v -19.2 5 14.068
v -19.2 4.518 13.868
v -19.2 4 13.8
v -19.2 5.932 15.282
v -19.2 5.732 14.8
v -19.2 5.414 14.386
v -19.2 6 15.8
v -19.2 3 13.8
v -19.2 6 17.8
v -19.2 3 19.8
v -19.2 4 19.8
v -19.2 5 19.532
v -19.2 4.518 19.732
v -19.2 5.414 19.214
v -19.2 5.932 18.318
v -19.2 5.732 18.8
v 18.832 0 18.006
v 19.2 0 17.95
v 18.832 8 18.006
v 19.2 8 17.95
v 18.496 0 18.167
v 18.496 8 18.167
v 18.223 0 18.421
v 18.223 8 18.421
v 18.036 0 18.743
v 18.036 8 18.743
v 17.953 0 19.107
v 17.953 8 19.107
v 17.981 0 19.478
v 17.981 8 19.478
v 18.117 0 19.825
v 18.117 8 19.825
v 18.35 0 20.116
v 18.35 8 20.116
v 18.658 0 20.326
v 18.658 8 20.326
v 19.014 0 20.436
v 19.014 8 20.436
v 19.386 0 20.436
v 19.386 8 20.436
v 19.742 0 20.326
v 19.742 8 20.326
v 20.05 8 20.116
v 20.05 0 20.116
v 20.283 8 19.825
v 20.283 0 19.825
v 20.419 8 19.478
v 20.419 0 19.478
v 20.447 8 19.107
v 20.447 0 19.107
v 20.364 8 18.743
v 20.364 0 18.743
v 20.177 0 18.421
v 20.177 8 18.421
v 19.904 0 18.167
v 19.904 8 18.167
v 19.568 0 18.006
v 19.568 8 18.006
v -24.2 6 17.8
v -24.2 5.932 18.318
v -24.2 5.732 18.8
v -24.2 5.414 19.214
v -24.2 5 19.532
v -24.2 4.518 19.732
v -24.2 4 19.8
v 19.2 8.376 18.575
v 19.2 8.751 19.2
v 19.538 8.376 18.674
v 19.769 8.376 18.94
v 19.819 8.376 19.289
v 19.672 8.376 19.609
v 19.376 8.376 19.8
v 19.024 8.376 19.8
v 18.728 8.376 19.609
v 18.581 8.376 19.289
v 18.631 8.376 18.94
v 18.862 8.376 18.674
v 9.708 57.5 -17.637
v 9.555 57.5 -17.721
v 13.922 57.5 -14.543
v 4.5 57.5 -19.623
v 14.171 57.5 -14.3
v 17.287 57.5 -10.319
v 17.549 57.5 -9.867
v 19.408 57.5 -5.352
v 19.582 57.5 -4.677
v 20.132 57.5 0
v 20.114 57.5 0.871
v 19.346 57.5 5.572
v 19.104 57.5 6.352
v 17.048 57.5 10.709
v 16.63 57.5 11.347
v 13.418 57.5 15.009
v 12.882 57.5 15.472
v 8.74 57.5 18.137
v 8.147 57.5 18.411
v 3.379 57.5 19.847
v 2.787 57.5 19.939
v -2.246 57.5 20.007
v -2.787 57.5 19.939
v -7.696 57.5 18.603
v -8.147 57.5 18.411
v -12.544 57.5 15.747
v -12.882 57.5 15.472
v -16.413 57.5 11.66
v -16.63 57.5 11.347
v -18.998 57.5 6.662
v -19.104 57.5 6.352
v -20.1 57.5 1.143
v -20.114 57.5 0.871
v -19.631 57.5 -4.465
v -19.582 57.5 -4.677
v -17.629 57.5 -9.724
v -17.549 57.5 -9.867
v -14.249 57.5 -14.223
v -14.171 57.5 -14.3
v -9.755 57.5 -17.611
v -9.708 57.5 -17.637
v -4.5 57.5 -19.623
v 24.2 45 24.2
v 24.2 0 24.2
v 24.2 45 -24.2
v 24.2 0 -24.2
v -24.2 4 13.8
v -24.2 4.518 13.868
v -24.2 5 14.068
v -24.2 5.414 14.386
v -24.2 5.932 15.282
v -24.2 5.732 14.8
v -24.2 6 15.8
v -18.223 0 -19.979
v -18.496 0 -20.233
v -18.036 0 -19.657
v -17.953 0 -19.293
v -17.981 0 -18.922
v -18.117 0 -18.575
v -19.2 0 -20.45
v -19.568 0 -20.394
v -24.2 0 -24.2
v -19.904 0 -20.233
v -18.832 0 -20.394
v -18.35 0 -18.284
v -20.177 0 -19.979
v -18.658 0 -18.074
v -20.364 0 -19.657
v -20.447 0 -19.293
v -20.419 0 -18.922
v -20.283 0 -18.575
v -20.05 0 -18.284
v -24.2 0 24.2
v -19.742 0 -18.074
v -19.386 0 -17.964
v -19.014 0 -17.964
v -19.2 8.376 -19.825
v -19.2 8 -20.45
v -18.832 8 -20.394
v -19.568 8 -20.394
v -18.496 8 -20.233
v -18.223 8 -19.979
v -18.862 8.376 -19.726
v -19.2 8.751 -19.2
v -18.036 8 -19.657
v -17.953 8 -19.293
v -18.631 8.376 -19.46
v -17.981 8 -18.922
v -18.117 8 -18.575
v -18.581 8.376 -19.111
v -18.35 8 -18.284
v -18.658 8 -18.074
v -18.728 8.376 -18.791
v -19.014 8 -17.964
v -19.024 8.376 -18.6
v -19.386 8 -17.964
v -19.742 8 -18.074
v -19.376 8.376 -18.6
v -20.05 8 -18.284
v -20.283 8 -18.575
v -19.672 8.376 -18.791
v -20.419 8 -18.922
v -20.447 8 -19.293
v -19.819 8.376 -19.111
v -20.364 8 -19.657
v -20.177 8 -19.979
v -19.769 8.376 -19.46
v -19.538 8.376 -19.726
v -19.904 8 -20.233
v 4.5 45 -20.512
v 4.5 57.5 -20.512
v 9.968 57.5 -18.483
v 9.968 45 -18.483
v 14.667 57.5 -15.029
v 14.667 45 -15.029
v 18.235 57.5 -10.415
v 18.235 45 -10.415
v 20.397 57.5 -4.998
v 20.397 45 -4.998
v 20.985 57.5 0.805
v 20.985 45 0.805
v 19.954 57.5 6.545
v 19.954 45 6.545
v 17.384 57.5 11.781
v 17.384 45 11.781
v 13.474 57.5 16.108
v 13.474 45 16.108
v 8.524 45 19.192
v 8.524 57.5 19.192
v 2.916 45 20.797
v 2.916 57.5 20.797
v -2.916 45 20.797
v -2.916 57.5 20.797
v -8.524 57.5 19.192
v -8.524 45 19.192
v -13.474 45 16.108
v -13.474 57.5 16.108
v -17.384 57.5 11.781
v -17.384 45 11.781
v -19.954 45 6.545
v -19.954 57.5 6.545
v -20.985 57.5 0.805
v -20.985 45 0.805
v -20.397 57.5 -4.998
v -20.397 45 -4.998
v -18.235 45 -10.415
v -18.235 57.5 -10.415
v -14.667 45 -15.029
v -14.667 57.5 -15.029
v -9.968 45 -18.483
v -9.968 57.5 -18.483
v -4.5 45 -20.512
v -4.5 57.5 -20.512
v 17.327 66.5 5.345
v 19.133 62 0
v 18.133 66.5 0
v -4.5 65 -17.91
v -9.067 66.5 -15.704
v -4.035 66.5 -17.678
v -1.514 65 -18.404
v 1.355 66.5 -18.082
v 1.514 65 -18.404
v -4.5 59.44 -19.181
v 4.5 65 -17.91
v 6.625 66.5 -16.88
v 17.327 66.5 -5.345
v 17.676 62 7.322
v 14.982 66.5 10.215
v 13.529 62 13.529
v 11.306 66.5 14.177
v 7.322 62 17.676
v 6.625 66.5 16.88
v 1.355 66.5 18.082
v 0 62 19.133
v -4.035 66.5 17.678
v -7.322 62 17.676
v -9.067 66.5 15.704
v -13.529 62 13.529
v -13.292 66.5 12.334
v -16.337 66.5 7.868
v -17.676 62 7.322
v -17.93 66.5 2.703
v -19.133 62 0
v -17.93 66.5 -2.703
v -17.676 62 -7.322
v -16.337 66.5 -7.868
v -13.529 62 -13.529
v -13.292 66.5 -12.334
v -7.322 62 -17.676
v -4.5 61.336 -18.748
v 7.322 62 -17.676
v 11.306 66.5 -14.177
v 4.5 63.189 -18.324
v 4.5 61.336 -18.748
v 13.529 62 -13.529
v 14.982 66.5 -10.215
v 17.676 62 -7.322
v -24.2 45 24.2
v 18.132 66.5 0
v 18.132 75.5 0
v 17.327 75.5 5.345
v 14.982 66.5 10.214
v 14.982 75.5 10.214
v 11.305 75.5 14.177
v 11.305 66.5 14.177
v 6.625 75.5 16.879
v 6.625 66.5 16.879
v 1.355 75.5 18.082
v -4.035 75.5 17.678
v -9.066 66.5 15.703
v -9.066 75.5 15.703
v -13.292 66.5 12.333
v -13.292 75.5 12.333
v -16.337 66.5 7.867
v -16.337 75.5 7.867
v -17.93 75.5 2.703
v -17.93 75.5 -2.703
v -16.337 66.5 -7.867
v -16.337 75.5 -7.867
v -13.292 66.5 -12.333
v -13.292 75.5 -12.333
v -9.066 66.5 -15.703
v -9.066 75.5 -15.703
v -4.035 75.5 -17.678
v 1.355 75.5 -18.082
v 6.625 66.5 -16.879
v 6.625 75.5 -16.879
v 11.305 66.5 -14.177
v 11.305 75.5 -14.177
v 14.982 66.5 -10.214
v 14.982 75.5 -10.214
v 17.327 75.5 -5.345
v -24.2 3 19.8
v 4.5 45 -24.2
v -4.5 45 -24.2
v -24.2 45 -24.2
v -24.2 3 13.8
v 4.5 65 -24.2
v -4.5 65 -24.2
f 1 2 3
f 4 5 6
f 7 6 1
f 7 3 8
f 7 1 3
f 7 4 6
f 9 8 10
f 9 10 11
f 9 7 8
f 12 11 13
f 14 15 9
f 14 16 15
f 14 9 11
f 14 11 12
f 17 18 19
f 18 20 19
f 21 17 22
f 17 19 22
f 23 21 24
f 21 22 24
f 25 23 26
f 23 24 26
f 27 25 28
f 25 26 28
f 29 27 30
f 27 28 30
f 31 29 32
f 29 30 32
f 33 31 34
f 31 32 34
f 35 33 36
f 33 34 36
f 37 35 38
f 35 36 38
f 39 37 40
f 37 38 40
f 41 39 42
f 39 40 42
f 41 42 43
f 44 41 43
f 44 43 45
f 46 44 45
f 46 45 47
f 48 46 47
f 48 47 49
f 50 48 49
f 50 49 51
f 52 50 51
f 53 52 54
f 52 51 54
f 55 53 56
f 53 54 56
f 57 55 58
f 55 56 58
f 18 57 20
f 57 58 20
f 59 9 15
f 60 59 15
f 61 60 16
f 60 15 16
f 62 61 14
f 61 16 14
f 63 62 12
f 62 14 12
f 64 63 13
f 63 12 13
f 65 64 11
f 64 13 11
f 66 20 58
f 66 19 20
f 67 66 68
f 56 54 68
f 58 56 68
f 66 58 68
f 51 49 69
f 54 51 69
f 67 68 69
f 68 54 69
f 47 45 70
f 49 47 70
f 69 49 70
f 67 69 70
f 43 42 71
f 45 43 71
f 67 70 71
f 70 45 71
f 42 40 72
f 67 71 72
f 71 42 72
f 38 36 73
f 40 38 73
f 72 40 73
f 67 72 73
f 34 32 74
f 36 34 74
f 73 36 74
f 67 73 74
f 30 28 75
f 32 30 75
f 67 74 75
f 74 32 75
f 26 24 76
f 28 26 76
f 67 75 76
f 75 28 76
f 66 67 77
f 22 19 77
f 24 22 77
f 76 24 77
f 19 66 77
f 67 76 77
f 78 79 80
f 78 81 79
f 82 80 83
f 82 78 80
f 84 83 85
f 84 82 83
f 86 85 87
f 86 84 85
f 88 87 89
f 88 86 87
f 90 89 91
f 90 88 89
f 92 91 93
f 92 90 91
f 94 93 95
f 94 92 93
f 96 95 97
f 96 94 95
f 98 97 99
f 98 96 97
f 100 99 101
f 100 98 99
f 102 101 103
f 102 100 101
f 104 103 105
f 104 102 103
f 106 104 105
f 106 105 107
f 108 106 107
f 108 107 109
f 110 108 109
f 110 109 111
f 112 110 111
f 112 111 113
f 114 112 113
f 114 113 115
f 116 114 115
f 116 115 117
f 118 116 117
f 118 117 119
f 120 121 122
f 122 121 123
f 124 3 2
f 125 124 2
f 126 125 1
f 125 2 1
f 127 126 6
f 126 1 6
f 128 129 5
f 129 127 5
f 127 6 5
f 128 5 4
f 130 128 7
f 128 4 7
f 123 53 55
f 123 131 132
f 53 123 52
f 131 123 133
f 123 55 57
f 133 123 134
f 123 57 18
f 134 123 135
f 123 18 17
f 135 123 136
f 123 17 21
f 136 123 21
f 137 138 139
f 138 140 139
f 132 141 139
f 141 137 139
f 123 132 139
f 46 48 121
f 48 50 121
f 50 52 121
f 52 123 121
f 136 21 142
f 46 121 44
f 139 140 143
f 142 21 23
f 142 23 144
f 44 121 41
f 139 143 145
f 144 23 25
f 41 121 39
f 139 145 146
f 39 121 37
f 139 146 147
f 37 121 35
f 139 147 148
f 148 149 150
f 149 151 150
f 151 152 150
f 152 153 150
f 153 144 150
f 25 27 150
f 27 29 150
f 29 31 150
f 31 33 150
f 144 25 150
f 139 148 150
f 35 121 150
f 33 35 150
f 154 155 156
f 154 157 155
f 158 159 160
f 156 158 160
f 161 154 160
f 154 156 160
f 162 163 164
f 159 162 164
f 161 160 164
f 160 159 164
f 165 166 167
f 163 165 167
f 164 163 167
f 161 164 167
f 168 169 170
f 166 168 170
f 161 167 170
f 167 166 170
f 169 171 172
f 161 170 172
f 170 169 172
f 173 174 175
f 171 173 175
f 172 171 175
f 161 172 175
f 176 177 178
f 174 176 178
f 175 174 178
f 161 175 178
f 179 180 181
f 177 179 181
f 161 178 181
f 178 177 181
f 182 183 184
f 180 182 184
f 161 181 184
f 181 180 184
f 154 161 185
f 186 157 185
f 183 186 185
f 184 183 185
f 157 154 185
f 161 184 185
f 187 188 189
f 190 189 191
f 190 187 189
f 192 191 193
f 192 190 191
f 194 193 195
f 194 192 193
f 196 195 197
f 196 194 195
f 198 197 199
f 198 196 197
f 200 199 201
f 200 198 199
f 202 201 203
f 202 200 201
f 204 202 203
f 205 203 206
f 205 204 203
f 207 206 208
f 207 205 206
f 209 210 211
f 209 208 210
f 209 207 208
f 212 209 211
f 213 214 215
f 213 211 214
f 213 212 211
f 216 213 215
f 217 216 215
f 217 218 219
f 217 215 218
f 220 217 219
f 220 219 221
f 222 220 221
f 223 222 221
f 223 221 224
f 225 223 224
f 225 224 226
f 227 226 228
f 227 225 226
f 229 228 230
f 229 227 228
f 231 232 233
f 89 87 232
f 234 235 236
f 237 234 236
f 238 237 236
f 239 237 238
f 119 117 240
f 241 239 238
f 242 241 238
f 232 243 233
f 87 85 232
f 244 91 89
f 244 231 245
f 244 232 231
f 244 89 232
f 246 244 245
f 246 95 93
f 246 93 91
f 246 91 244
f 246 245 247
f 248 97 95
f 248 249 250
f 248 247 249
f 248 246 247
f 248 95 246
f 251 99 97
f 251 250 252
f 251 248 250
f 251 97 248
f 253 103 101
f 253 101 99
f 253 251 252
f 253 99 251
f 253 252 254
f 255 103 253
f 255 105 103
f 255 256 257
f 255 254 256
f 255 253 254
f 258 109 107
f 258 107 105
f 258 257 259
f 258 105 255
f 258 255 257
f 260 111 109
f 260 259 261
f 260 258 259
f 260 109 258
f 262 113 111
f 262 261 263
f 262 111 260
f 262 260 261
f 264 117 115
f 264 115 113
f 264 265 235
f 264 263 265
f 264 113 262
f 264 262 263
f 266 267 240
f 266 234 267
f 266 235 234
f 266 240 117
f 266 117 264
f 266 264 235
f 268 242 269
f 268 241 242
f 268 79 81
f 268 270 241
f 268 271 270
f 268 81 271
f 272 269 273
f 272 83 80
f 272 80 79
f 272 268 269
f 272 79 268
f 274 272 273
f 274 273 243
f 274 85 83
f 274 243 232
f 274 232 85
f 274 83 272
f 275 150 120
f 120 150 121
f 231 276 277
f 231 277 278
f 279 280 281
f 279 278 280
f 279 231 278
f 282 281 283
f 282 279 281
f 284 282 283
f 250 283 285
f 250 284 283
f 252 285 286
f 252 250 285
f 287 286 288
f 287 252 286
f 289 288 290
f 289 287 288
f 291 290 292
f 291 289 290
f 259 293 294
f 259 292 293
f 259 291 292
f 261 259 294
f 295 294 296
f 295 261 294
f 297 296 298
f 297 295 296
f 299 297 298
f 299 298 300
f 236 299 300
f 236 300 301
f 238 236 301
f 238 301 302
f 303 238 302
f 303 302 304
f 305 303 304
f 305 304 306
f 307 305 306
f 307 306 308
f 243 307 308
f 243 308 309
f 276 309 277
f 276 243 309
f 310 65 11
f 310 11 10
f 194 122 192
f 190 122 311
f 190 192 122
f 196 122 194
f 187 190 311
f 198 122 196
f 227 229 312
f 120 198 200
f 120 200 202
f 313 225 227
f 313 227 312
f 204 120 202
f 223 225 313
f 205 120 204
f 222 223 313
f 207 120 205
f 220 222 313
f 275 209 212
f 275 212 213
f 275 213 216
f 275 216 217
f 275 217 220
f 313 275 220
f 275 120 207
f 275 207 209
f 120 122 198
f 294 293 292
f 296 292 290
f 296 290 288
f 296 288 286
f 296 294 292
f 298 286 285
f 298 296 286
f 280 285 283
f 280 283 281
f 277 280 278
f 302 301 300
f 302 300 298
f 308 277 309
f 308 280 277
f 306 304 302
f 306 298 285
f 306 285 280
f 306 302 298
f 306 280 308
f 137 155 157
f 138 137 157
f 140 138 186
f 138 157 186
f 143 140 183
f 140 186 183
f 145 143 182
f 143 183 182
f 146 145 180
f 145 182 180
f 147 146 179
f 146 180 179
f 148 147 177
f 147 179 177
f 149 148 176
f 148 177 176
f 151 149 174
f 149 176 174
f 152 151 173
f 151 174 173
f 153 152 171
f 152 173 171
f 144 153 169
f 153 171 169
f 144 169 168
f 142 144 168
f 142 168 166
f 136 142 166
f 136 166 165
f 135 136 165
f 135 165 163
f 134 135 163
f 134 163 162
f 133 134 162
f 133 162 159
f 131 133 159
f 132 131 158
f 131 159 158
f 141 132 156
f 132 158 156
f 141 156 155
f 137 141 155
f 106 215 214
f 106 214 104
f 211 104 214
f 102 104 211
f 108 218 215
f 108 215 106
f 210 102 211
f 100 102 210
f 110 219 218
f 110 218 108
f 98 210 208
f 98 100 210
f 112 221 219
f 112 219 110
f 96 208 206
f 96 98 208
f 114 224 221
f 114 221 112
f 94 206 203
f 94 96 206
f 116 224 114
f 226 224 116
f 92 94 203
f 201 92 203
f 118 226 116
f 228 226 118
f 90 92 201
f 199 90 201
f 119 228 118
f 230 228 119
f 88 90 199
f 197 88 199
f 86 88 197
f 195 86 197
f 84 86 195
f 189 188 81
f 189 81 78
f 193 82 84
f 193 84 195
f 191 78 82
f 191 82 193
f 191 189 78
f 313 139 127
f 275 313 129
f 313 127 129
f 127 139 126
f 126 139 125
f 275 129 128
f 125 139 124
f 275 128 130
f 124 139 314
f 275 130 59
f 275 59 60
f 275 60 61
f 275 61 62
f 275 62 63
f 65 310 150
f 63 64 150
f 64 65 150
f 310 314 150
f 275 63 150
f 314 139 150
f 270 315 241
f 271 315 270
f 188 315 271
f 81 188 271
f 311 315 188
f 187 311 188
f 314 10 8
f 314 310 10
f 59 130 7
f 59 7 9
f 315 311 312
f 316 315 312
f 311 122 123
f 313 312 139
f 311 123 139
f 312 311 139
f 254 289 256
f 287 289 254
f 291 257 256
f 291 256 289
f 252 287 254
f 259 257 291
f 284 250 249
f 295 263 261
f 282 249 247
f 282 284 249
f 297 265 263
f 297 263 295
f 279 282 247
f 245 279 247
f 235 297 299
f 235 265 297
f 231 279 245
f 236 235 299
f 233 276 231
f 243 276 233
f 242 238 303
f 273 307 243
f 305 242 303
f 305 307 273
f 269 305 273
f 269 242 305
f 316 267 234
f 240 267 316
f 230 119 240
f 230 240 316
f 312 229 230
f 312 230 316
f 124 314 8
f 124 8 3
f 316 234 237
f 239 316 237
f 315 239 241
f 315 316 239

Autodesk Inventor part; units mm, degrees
ref_plane "YZ Plane" through (0, 0, 0) normal (1, 0, 0) x (0, 1, 0)
ref_plane "XZ Plane" through (0, 0, 0) normal (0, 1, 0) x (-1, 0, 0)
ref_plane "XY Plane" through (0, 0, 0) normal (0, 0, 1) x (1, 0, 0)
sketch "Sketch1" plane through (0, 0, 0) normal (0, 1, 0) x (-1, 0, 0)
  line L0 (-24.2, -24.2) -> (24.2, -24.2)
  line L1 (24.2, -24.2) -> (24.2, 24.2)
  line L2 (24.2, 24.2) -> (-24.2, 24.2)
  line L3 (-24.2, 24.2) -> (-24.2, -24.2)
  point P0 (0, 0)
  point P1 (0, 24.2)
  point P2 (-24.2, 0)
  dimension "d0" = 48.4
  dimension "d2" = 48.4
extrude "Extrusion1" add sketch "Sketch1" along normal blind 45
sketch "Sketch2" plane through (0, 45, 0) normal (0, 1, 0) x (1, 0, 0)
  circle A0 centre (0, 0) radius 21
  dimension "d5" = 42
extrude "Extrusion2" add sketch "Sketch2" along normal blind 12.5
sketch "Sketch3" plane through (0, 57.5, 0) normal (0, 1, 0) x (1, 0, 0)
  circle A0 centre (0, 0) radius 21 projected
  circle A1 centre (0, 0) radius 20.1325
extrude "Extrusion3" add sketch "Sketch3" along normal blind 9 contours A1
chamfer "Chamfer1" distance 2 distance2 9 1 edges at (-20.1325, 66.5, 0) measured on face at (-5.7471, 66.5, 1.5127)
sketch "Sketch4" plane through (0, 66.5, 0) normal (0, 1, 0) x (1, 0, 0)
  circle A0 centre (0, 0) radius 18.1325 projected
extrude "Extrusion4" add sketch "Sketch4" along normal blind 9
sketch "Sketch5" plane through (0, 45, 0) normal (0, 1, 0) x (1, 0, 0)
  circle A0 centre (0, 0) radius 21 projected
  line L0 (24.2, 24.2) -> (-24.2, 24.2) projected
  line L1 (-4.5, 24.2) -> (4.5, 24.2)
  line L2 (4.5, 24.2) -> (4.5, 14)
  line L3 (4.5, 14) -> (-4.5, 14)
  line L4 (-4.5, 14) -> (-4.5, 24.2)
  dimension "d16" = 9
  dimension "d18" = 4.5
extrude "Extrusion5" add sketch "Sketch5" along normal blind 20 contours L2 L3 L4 A0 | A0 L4 L0 L2 picked at (0.5035, 16.3152)
sketch "Sketch6" plane through (0, 0, 0) normal (0, -1, 0) x (1, 0, 0)
  line L0 (24.2, -24.2) -> (-24.2, -24.2) projected
  line L1 (24.2, 24.2) -> (24.2, -24.2) projected
  line L2 (-24.2, 24.2) -> (24.2, 24.2) projected
  line L3 (-24.2, -24.2) -> (-24.2, 24.2) projected
  point P0 (0, 0)
  point P1 (19.2, 19.2)
  point P2 (-19.2, -19.2)
  dimension "d21" = 5
  dimension "d22" = 5
  dimension "d23" = 5
  dimension "d24" = 5
hole "Hole1" at (19.2, 0, 19.2) at (-19.2, 0, -19.2) direction (0, 1, 0) diameter 2.5 depth 8 tip angle 118
sketch "Sketch7" plane through (-24.2, 0, -24.2) normal (-1, 0, 0) x (0, 0, 1)
  line L0 (38, 6) -> (44, 6)
  line L1 (44, 6) -> (44, 3)
  line L2 (44, 3) -> (38, 3)
  line L3 (38, 3) -> (38, 6)
  point P0 (24.2, 0)
extrude "Extrusion6" cut sketch "Sketch7" against normal blind 5
fillet "Fillet1" radius 2 2 edges at (-21.7, 6, 13.8) (-21.7, 6, 19.8)
properties part number "Lidar"
